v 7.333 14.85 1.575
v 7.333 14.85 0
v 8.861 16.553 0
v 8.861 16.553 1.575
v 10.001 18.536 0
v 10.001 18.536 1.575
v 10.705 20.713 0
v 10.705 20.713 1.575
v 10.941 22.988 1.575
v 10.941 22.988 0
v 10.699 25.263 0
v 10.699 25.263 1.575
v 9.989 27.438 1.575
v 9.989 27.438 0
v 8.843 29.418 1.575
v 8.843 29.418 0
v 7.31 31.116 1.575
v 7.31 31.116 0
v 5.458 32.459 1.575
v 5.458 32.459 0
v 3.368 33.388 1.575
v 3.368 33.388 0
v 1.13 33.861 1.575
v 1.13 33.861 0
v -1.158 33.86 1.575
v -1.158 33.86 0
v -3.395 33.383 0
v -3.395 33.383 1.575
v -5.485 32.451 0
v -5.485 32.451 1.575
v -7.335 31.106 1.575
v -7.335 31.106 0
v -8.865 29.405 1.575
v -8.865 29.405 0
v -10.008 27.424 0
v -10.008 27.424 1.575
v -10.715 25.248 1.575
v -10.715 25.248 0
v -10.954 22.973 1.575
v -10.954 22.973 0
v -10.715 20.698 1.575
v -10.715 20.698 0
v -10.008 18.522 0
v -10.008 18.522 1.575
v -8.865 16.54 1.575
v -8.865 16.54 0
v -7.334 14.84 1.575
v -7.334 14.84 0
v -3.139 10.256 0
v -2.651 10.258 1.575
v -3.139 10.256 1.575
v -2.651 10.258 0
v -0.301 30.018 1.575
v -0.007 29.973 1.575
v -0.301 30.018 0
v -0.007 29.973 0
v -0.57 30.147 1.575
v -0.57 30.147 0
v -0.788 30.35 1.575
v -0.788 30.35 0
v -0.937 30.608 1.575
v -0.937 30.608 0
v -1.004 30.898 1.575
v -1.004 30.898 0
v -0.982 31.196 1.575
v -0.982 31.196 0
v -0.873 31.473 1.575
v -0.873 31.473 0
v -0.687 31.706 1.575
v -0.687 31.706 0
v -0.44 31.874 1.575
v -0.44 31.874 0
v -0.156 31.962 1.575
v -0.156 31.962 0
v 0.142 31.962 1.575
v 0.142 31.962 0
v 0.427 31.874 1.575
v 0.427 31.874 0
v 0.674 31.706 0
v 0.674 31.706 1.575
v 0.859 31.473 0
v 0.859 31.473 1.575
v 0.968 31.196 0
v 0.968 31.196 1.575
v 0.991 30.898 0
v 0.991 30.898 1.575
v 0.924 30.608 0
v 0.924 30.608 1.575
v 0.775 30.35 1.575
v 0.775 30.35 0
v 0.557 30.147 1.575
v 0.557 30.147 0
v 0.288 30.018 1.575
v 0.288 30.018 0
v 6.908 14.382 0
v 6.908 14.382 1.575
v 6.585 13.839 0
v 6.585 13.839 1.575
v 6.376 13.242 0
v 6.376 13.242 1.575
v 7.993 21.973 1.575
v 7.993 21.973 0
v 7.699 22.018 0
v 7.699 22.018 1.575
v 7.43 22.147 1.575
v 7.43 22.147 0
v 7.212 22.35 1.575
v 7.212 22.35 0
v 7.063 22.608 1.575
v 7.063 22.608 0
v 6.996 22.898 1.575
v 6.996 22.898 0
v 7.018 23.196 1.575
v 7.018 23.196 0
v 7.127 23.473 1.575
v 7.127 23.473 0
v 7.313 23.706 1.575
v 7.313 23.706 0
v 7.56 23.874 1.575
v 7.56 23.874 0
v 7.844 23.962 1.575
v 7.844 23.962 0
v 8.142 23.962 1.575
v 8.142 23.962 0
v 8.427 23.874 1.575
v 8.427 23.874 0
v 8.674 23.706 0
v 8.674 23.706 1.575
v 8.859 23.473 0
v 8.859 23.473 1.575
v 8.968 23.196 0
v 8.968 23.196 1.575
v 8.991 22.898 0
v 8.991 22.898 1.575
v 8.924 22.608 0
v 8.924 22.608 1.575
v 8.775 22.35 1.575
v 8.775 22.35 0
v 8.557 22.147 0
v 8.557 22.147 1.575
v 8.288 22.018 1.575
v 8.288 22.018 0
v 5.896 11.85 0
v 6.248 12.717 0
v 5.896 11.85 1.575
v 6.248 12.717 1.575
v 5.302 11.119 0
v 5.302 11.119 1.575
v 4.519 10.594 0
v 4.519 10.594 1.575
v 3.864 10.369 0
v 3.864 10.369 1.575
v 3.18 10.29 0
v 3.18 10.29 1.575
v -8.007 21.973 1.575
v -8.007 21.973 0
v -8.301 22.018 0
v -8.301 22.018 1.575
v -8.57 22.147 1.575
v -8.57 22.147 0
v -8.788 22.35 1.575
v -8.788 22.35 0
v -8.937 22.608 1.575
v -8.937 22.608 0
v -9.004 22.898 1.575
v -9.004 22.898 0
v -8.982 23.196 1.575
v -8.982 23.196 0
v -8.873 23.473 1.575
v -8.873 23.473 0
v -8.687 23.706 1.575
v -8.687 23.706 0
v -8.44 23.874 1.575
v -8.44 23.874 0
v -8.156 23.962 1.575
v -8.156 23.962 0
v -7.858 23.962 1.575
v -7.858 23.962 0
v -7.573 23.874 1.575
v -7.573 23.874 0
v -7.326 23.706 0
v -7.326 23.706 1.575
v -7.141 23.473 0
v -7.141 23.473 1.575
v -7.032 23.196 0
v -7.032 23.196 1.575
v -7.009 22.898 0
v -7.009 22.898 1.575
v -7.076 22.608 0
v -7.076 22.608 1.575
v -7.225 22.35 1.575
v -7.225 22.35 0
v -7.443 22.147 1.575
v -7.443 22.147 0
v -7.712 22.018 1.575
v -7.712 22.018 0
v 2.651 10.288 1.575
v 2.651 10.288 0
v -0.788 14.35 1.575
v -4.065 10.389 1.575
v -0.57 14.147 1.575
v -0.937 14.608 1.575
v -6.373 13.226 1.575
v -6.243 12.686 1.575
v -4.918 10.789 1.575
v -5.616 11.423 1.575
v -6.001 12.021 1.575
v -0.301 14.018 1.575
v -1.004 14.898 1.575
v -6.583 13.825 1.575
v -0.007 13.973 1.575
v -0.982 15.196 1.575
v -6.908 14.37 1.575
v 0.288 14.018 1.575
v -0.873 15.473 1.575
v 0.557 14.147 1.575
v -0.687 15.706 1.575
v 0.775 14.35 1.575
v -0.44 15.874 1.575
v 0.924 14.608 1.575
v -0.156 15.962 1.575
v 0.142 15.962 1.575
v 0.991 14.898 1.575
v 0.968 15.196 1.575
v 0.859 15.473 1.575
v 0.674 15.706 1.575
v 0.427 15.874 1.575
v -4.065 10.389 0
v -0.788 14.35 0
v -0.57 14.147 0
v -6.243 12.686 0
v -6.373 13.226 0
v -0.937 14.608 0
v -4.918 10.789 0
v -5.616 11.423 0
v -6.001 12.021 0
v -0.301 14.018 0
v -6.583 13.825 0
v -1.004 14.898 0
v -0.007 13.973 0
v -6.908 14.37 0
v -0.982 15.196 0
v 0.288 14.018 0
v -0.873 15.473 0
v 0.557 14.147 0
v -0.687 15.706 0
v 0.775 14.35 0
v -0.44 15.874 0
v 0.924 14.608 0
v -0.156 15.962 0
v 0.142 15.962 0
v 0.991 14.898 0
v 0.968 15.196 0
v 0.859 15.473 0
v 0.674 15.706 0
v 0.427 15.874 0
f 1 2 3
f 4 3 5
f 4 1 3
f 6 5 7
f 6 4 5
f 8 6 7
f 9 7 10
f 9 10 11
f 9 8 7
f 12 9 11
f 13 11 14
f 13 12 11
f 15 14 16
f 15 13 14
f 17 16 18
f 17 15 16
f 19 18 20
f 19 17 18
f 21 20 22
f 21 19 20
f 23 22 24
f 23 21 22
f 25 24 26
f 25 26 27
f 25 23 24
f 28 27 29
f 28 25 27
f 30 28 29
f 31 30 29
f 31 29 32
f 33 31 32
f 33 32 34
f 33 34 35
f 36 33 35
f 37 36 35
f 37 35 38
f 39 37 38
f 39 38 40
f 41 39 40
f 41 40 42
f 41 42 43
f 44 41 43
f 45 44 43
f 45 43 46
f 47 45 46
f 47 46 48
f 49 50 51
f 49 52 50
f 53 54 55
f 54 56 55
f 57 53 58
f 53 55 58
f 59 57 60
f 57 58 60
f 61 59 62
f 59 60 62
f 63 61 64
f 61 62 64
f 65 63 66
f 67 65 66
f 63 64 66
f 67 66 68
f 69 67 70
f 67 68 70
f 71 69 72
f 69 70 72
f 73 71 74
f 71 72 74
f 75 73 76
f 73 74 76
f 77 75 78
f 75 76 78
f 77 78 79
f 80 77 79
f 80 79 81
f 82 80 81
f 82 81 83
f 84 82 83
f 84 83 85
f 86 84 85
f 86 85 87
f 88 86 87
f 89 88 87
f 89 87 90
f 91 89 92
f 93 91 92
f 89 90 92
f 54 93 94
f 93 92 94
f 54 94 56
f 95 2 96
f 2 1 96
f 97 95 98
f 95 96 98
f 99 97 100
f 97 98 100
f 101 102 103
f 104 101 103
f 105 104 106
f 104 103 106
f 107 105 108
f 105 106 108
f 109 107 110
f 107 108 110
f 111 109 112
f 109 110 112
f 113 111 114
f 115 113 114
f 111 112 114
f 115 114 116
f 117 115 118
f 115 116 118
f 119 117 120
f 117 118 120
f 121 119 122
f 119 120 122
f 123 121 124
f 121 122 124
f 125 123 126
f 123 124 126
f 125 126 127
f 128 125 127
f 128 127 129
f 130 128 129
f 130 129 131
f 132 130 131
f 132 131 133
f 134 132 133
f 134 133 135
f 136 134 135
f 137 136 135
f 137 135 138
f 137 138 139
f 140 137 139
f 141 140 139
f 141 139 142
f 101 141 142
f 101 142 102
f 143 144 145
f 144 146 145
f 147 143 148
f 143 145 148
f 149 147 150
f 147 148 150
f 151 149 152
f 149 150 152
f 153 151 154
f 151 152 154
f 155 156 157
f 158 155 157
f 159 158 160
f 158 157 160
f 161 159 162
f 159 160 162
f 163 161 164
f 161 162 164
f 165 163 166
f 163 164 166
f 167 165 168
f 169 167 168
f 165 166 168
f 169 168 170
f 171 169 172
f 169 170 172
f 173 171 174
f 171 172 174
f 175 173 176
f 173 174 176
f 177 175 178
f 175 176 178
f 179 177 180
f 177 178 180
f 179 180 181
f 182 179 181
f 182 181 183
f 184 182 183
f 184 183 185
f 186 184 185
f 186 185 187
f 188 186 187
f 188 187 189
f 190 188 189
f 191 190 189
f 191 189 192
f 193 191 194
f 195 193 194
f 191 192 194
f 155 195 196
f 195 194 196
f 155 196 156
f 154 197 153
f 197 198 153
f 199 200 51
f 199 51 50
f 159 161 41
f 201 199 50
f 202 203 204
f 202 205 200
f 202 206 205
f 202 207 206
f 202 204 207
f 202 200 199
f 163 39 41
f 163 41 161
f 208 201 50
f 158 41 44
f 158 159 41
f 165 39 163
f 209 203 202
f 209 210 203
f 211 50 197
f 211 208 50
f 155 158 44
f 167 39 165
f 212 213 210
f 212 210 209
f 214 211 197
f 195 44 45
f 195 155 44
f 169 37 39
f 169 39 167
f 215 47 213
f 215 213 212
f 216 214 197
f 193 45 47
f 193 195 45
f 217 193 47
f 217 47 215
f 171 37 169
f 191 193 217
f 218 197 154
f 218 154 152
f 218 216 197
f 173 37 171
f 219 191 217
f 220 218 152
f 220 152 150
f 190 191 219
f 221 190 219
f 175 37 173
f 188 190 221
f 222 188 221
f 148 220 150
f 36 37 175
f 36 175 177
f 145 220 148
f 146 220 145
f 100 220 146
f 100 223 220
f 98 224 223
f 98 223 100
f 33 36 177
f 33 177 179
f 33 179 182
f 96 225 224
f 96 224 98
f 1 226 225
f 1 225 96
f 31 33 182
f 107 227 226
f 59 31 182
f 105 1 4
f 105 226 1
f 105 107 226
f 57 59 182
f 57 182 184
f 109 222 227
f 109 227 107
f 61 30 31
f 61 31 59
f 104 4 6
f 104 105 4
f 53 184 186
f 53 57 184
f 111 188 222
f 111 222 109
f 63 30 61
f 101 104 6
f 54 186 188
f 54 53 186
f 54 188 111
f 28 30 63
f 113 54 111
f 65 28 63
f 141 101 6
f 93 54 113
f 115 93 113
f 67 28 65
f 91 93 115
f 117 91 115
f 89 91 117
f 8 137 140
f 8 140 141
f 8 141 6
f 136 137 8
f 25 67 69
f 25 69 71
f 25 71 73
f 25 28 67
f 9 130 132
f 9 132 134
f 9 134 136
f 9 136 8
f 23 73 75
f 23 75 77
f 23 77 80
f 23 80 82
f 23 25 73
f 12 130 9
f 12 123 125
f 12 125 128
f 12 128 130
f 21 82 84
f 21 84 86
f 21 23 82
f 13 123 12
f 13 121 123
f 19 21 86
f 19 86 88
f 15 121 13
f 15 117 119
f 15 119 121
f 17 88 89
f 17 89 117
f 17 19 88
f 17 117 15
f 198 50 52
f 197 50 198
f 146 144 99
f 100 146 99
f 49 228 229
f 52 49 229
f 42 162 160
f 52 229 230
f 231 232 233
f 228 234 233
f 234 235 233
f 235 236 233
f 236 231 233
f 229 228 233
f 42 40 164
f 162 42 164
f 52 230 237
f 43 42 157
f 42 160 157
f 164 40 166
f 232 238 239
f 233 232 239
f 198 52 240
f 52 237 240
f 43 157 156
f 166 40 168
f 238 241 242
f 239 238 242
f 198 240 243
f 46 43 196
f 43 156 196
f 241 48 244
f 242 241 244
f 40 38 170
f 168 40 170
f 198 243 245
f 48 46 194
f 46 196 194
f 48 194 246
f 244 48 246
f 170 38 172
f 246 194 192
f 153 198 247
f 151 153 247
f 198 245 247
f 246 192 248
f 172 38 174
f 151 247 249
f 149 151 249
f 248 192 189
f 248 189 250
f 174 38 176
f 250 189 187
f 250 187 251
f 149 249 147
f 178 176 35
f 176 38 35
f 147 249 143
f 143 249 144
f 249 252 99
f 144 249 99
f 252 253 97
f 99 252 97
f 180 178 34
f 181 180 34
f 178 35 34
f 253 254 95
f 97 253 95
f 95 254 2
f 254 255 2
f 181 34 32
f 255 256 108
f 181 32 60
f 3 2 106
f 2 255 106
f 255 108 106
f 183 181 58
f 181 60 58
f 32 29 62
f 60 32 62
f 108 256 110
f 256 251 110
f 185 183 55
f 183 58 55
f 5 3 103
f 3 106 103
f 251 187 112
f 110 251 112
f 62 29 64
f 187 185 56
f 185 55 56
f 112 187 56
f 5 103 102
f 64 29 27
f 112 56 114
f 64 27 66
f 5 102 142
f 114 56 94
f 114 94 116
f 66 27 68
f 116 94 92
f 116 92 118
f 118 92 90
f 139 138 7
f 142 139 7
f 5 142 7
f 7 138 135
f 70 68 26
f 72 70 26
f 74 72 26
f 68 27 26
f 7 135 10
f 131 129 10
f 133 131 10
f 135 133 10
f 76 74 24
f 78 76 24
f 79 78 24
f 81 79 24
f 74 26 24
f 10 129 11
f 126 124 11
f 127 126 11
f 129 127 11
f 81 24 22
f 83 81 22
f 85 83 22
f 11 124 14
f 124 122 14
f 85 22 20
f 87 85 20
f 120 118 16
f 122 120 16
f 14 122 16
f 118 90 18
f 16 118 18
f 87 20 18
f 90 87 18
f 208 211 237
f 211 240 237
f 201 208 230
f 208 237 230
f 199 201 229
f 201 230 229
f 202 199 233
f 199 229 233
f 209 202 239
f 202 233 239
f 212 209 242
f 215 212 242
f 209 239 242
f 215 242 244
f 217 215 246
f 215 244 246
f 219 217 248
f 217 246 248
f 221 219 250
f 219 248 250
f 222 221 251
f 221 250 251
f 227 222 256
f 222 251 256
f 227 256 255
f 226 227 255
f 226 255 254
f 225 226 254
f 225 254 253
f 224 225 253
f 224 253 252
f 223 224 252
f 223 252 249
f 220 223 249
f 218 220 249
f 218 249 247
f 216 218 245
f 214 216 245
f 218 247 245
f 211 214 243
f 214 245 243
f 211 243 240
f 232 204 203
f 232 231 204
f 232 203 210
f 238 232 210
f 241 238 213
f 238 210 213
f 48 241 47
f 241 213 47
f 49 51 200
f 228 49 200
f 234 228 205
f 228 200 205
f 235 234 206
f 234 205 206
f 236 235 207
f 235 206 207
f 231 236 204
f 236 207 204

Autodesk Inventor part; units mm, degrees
ref_plane "YZ Plane" through (0, 0, 0) normal (1, 0, 0) x (0, 1, 0)
ref_plane "XZ Plane" through (0, 0, 0) normal (0, 1, 0) x (-1, 0, 0)
ref_plane "XY Plane" through (0, 0, 0) normal (0, 0, 1) x (1, 0, 0)
sketch "Sketch1" plane through (0, 0, 0) normal (0, 0, 1) x (1, 0, 0)
  line L0 (-2.54, -8.19) -> (2.54, -8.19)
  line L1 (2.54, -8.19) -> (2.54, 8.19)
  line L2 (-2.54, 8.19) -> (-2.54, -8.19)
  line L3 (-2.54, -8.19) -> (2.54, 8.19) construction
  line L4 (2.54, -8.19) -> (-2.54, 8.19) construction
  circle A0 centre (0, 16.6545) radius 2.5 construction
  circle A1 centre (0, 16.6545) radius 5
  arc A2 (6.8029, 15.0051) -> (-6.8044, 15.0114) centre (0, 16.6545) ccw
  line L5 (-2.54, 8.19) -> (-2.54, 10.2591)
  line L6 (2.54, 8.19) -> (2.54, 10.2869)
  line L7 (0, 0) -> (0, 10.7842) construction
  line L8 (-2.54, 10.2591) -> (-3.9944, 10.2511)
  line L9 (2.54, 10.2869) -> (3.9944, 10.2948)
  line L10 (-3.9944, 10.2511) -> (-4.1214, 3.9003)
  line L11 (3.9944, 10.2948) -> (4.1214, 3.9454)
  line L12 (-4.1214, 3.9003) -> (-6.8044, 15.0114)
  line L13 (4.1214, 3.9454) -> (6.8029, 15.0051)
  line L14 (0, 0) -> (0, 22.9511) construction
  point P0 (-3.2672, 10.2551)
  dimension "d2" = 5
  dimension "d3" = 10
  dimension "d4" = 14
  dimension "d8" = 1.5815
  dimension "d9" = 1.5815
  dimension "d10" = 6.35
  dimension "d11" = 6.35
  dimension "d18" = 1.4545
  dimension "d19" = 1.4545
  dimension "d31" = 2.54
  dimension "d32" = 2.54
  dimension "d33" = 0
extrude "Plate1" add sketch "Sketch1" along normal blind 1.5748
sketch "Sketch2" plane through (0, 0, 0) normal (0, 0, -1) x (-1, 0, 0)
  circle A0 centre (0, 16.6545) radius 5 projected
  line L0 (-3.9944, 10.2948) -> (-4.1214, 3.9454) projected
  line L1 (-2.54, 10.2869) -> (-3.9944, 10.2948) projected
  line L2 (-2.54, -8.19) -> (-2.54, 10.2869) projected
  line L3 (2.54, -8.19) -> (-2.54, -8.19) projected
  line L4 (2.54, 10.2591) -> (2.54, -8.19) projected
  line L5 (3.9944, 10.2511) -> (2.54, 10.2591) projected
  line L6 (4.1214, 3.9003) -> (3.9944, 10.2511) projected
  line L7 (6.8044, 15.0114) -> (4.1214, 3.9003) projected
  arc A1 (6.8044, 15.0114) -> (-6.8029, 15.0051) centre (0, 16.6545) ccw projected
  line L8 (-4.1214, 3.9454) -> (-6.8029, 15.0051) projected
  line L9 (-1.5875, -17.19) -> (1.5875, -17.19)
  line L10 (1.5875, -17.19) -> (1.5875, 0.81)
  line L11 (1.5875, 0.81) -> (-1.5875, 0.81)
  line L12 (-1.5875, 0.81) -> (-1.5875, -17.19)
  line L13 (-1.5875, -17.19) -> (1.5875, 0.81) construction
  line L14 (1.5875, -17.19) -> (-1.5875, 0.81) construction
  point P0 (0, 0)
  point P1 (0, -8.19)
  dimension "d14" = 3.175
extrude "Extrusion1" cut sketch "Sketch2" against normal blind 25.4 contours L12 L11 L10 L3 | L3 L10 L9 L12
sketch "Sketch3" plane through (0, 0, 1.5748) normal (0, 0, 1) x (1, 0, 0)
  circle A0 centre (-37.757, 0) radius 3
  line L0 (-39.3445, -2.5456) -> (-36.1695, -2.5456)
  line L1 (-36.1695, -2.5456) -> (-36.1695, 2.5456)
  line L2 (-36.1695, 2.5456) -> (-39.3445, 2.5456)
  line L3 (-39.3445, 2.5456) -> (-39.3445, -2.5456)
  line L4 (-39.3445, -2.5456) -> (-36.1695, 2.5456) construction
  line L5 (-36.1695, -2.5456) -> (-39.3445, 2.5456) construction
  circle A1 centre (-37.757, 0) radius 4
  point P0 (0, 0)
  point P1 (-37.757, 3)
  point P2 (-37.757, 4)
  dimension "d35" = 8
  dimension "d28" = 6
  dimension "d29" = 3.175
  dimension "d30" = 5.0911
  dimension "d34" = 0.4545
  dimension "d36" = 1.4545
fillet "Fillet4" radius 0.381 6 edges at (-4.1214, 3.9003, 0.7874) (4.1214, 3.9454, 0.7874) (-2.54, -8.19, 0.7874) (-1.5875, -8.19, 0.7874) (1.5875, -8.19, 0.7874) (2.54, -8.19, 0.7874)
sketch "Sketch4" plane through (0, 0, 1.5748) normal (0, 0, 1) x (1, 0, 0)
  arc A0 (2.159, -8.19) -> (2.54, -7.809) centre (2.159, -7.809) ccw projected
  line L0 (2.54, 10.2869) -> (2.54, -7.809) projected
  line L1 (3.9944, 10.2948) -> (2.54, 10.2869) projected
  line L2 (4.0627, 6.8835) -> (3.9944, 10.2948) projected
  arc A1 (4.0627, 6.8835) -> (4.8139, 6.8013) centre (4.4436, 6.8911) ccw projected
  line L3 (6.8029, 15.0051) -> (4.8139, 6.8013) projected
  arc A2 (6.8029, 15.0051) -> (-6.8044, 15.0114) centre (0, 16.6545) ccw projected
  line L4 (-4.8137, 6.7674) -> (-6.8044, 15.0114) projected
  arc A3 (-4.8137, 6.7674) -> (-4.0625, 6.8492) centre (-4.4434, 6.8568) ccw projected
  line L5 (-3.9944, 10.2511) -> (-4.0625, 6.8492) projected
  line L6 (-2.54, 10.2591) -> (-3.9944, 10.2511) projected
  line L7 (-2.54, -7.809) -> (-2.54, 10.2591) projected
  arc A4 (-2.54, -7.809) -> (-2.159, -8.19) centre (-2.159, -7.809) ccw projected
  line L8 (-1.9685, -8.19) -> (-2.159, -8.19) projected
  arc A5 (-1.9685, -8.19) -> (-1.5875, -7.809) centre (-1.9685, -7.809) ccw projected
  line L9 (-1.5875, -7.809) -> (-1.5875, 0.81) projected
  line L10 (-1.5875, 0.81) -> (1.5875, 0.81) projected
  line L11 (1.5875, 0.81) -> (1.5875, -7.809) projected
  arc A6 (1.5875, -7.809) -> (1.9685, -8.19) centre (1.9685, -7.809) ccw projected
  line L12 (2.159, -8.19) -> (1.9685, -8.19) projected
  circle A7 centre (0, 16.6545) radius 5 projected
  point P0 (0, 0)
extrude "Extrusion2" add sketch "Sketch4" against normal up to surface (1.5748 mm away) contours A7
sketch "Sketch5" plane through (0, 0, 1.5748) normal (0, 0, 1) x (1, 0, 0)
  arc A0 (2.159, -8.19) -> (2.54, -7.809) centre (2.159, -7.809) ccw projected
  line L0 (2.54, 10.2869) -> (2.54, -7.809) projected
  line L1 (3.9944, 10.2948) -> (2.54, 10.2869) projected
  line L2 (4.0627, 6.8835) -> (3.9944, 10.2948) projected
  arc A1 (4.0627, 6.8835) -> (4.8139, 6.8013) centre (4.4436, 6.8911) ccw projected
  line L3 (6.8029, 15.0051) -> (4.8139, 6.8013) projected
  arc A2 (6.8029, 15.0051) -> (-6.8044, 15.0114) centre (0, 16.6545) ccw projected
  line L4 (-4.8137, 6.7674) -> (-6.8044, 15.0114) projected
  arc A3 (-4.8137, 6.7674) -> (-4.0625, 6.8492) centre (-4.4434, 6.8568) ccw projected
  line L5 (-3.9944, 10.2511) -> (-4.0625, 6.8492) projected
  line L6 (-2.54, 10.2591) -> (-3.9944, 10.2511) projected
  line L7 (-2.54, -7.809) -> (-2.54, 10.2591) projected
  arc A4 (-2.54, -7.809) -> (-2.159, -8.19) centre (-2.159, -7.809) ccw projected
  line L8 (-1.9685, -8.19) -> (-2.159, -8.19) projected
  arc A5 (-1.9685, -8.19) -> (-1.5875, -7.809) centre (-1.9685, -7.809) ccw projected
  line L9 (-1.5875, -7.809) -> (-1.5875, 0.81) projected
  line L10 (-1.5875, 0.81) -> (1.5875, 0.81) projected
  line L11 (1.5875, 0.81) -> (1.5875, -7.809) projected
  arc A6 (1.5875, -7.809) -> (1.9685, -8.19) centre (1.9685, -7.809) ccw projected
  line L12 (2.159, -8.19) -> (1.9685, -8.19) projected
  arc A7 (1.5644, 14.7045) -> (-1.5644, 14.7045) centre (0, 16.6545) ccw
  line L13 (1.5644, 14.7045) -> (-1.5644, 14.7045)
  point P0 (0, 0)
  point P1 (0, 19.1545)
  dimension "d40" = 5
  dimension "d44" = 4.45
extrude "Extrusion3" cut sketch "Sketch5" against normal blind 25.4 contours L13 A7
sketch "Sketch6" plane through (0, 0, 1.5748) normal (0, 0, 1) x (1, 0, 0)
  circle A0 centre (-0.0066, 22.9731) radius 10.9474
  line L0 (3.9944, 10.2948) -> (2.54, 10.2869) projected
  point P0 (0, 0)
  dimension "d45" = 21.8948
  dimension "d46" = 12.7
extrude "Extrusion4" add sketch "Sketch6" against normal up to surface (1.5748 mm away)
fillet "Fillet5" radius 3.175 2 edges at (-6.6204, 14.2495, 0.7874) (6.6225, 14.2611, 0.7874)
chamfer "Chamfer3" distance 3.175 angle 2 1 edges at (-2.54, 10.2591, 0.7874) measured on face at (-2.54, 4.2364, 0.5249)
chamfer "Chamfer4" distance 3.175 angle 2 1 edges at (2.54, 10.2869, 0.7874) measured on face at (2.54, -1.7771, 1.0499)
sketch "Sketch7" plane through (0, 0, 1.5748) normal (0, 0, 1) x (1, 0, 0)
  line L0 (-4.8137, 6.7674) -> (-6.3734, 13.2264) projected
  arc A0 (-4.8137, 6.7674) -> (-4.0625, 6.8492) centre (-4.4434, 6.8568) ccw projected
  line L1 (-3.9944, 10.2511) -> (-4.0625, 6.8492) projected
  line L2 (-2.6509, 10.2585) -> (-3.9944, 10.2511) projected
  line L3 (-2.54, 7.0841) -> (-2.6509, 10.2585) projected
  line L4 (-2.54, -7.809) -> (-2.54, 7.0841) projected
  arc A1 (-2.54, -7.809) -> (-2.159, -8.19) centre (-2.159, -7.809) ccw projected
  line L5 (-1.9685, -8.19) -> (-2.159, -8.19) projected
  arc A2 (-1.9685, -8.19) -> (-1.5875, -7.809) centre (-1.9685, -7.809) ccw projected
  line L6 (-1.5875, -7.809) -> (-1.5875, 0.81) projected
  line L7 (-1.5875, 0.81) -> (1.5875, 0.81) projected
  line L8 (1.5875, 0.81) -> (1.5875, -7.809) projected
  arc A3 (1.5875, -7.809) -> (1.9685, -8.19) centre (1.9685, -7.809) ccw projected
  line L9 (2.159, -8.19) -> (1.9685, -8.19) projected
  arc A4 (2.159, -8.19) -> (2.54, -7.809) centre (2.159, -7.809) ccw projected
  line L10 (2.54, 7.1119) -> (2.54, -7.809) projected
  line L11 (2.6509, 10.2875) -> (2.54, 7.1119) projected
  line L12 (3.9944, 10.2948) -> (2.6509, 10.2875) projected
  line L13 (4.0627, 6.8835) -> (3.9944, 10.2948) projected
  arc A5 (4.0627, 6.8835) -> (4.8139, 6.8013) centre (4.4436, 6.8911) ccw projected
  line L14 (6.3756, 13.2425) -> (4.8139, 6.8013) projected
  arc A6 (7.3326, 14.8503) -> (6.3756, 13.2425) centre (9.4612, 12.4944) ccw projected
  arc A7 (7.3326, 14.8503) -> (-7.3345, 14.84) centre (-0.0066, 22.9731) ccw projected
  arc A8 (-6.3734, 13.2264) -> (-7.3345, 14.84) centre (-9.4597, 12.4812) ccw projected
  circle A9 centre (-0.0066, 22.9731) radius 8
  point P0 (0, 0)
  point P1 (-0.0066, 14.9731)
  point P2 (-0.0066, 30.9731)
  point P3 (-8.0066, 22.9731)
  point P4 (7.9934, 22.9731)
  dimension "d56" = 16
hole "Hole1" at (-0.0066, 14.9731, 1.5748) at (-0.0066, 30.9731, 1.5748) at (-8.0066, 22.9731, 1.5748) at (7.9934, 22.9731, 1.5748) direction (0, 0, -1) diameter 2 end through all
sketch "Sketch8" plane through (0, 0, 1.5748) normal (0, 0, 1) x (1, 0, 0)
  circle A0 centre (-8.0066, 22.9731) radius 1 projected
  circle A1 centre (-0.0066, 14.9731) radius 1 projected
  circle A2 centre (-0.0066, 30.9731) radius 1 projected
  circle A3 centre (7.9934, 22.9731) radius 1 projected
  line L0 (-4.8137, 6.7674) -> (-6.3734, 13.2264) projected
  arc A4 (-4.8137, 6.7674) -> (-4.0625, 6.8492) centre (-4.4434, 6.8568) ccw projected
  line L1 (-3.9944, 10.2511) -> (-4.0625, 6.8492) projected
  line L2 (-2.6509, 10.2585) -> (-3.9944, 10.2511) projected
  line L3 (-2.54, 7.0841) -> (-2.6509, 10.2585) projected
  line L4 (-2.54, -7.809) -> (-2.54, 7.0841) projected
  arc A5 (-2.54, -7.809) -> (-2.159, -8.19) centre (-2.159, -7.809) ccw projected
  line L5 (-1.9685, -8.19) -> (-2.159, -8.19) projected
  arc A6 (-1.9685, -8.19) -> (-1.5875, -7.809) centre (-1.9685, -7.809) ccw projected
  line L6 (-1.5875, -7.809) -> (-1.5875, 0.81) projected
  line L7 (-1.5875, 0.81) -> (1.5875, 0.81) projected
  line L8 (1.5875, 0.81) -> (1.5875, -7.809) projected
  arc A7 (1.5875, -7.809) -> (1.9685, -8.19) centre (1.9685, -7.809) ccw projected
  line L9 (2.159, -8.19) -> (1.9685, -8.19) projected
  arc A8 (2.159, -8.19) -> (2.54, -7.809) centre (2.159, -7.809) ccw projected
  line L10 (2.54, 7.1119) -> (2.54, -7.809) projected
  line L11 (2.6509, 10.2875) -> (2.54, 7.1119) projected
  line L12 (3.9944, 10.2948) -> (2.6509, 10.2875) projected
  line L13 (4.0627, 6.8835) -> (3.9944, 10.2948) projected
  arc A9 (4.0627, 6.8835) -> (4.8139, 6.8013) centre (4.4436, 6.8911) ccw projected
  line L14 (6.3756, 13.2425) -> (4.8139, 6.8013) projected
  arc A10 (7.3326, 14.8503) -> (6.3756, 13.2425) centre (9.4612, 12.4944) ccw projected
  arc A11 (7.3326, 14.8503) -> (-7.3345, 14.84) centre (-0.0066, 22.9731) ccw projected
  arc A12 (-6.3734, 13.2264) -> (-7.3345, 14.84) centre (-9.4597, 12.4812) ccw projected
  line L15 (-15.0886, 10.1904) -> (17.7412, 10.3701)
  line L16 (17.7412, 10.3701) -> (17.8596, -11.273)
  line L17 (17.8596, -11.273) -> (-14.9701, -11.4526)
  line L18 (-14.9701, -11.4526) -> (-15.0886, 10.1904)
  point P0 (0, 0)
extrude "Extrusion5" cut sketch "Sketch8" against normal blind 25.4 contours A4 L1 L2 L3 L4 A5 L5 A6 L6 L7 L8 A7 L9 A8 L10 L11 L12 L13 A9 L14 L15 L16 L17 L18 L0 | L0 L15 L1 A4 | L15 L11 L10 A8 L9 A7 L8 L7 L6 A6 L5 A5 L4 L3 | L15 L14 A9 L13
fillet "Fillet6" radius 3.175 2 edges at (-5.6528, 10.2421, 0.7874) (5.6631, 10.304, 0.7874)
equation "\"d18\" = d36"
equation "\"d19\" = d36"
equation "\"d62\" = Thickness"
equation "\"BendRadius\" = Thickness"
equation "\"BendReliefWidth\" = Thickness"
equation "\"BendReliefDepth\" = 0.5 * Thickness"
equation "\"CornerReliefSize\" = 4 * Thickness"
equation "\"MinimumRemnant\" = 2 * Thickness"
equation "\"TransitionRadius\" = BendRadius"
equation "\"JacobiRadiusSize\" = BendRadius"
equation "\"GapSize\" = Thickness"
equation "\"d12\" = BendRadius"
equation "\"Thickness\" = 1.5748"
properties part number "8mm OD 6mm ID Rod End125DynamixelSpacer"
